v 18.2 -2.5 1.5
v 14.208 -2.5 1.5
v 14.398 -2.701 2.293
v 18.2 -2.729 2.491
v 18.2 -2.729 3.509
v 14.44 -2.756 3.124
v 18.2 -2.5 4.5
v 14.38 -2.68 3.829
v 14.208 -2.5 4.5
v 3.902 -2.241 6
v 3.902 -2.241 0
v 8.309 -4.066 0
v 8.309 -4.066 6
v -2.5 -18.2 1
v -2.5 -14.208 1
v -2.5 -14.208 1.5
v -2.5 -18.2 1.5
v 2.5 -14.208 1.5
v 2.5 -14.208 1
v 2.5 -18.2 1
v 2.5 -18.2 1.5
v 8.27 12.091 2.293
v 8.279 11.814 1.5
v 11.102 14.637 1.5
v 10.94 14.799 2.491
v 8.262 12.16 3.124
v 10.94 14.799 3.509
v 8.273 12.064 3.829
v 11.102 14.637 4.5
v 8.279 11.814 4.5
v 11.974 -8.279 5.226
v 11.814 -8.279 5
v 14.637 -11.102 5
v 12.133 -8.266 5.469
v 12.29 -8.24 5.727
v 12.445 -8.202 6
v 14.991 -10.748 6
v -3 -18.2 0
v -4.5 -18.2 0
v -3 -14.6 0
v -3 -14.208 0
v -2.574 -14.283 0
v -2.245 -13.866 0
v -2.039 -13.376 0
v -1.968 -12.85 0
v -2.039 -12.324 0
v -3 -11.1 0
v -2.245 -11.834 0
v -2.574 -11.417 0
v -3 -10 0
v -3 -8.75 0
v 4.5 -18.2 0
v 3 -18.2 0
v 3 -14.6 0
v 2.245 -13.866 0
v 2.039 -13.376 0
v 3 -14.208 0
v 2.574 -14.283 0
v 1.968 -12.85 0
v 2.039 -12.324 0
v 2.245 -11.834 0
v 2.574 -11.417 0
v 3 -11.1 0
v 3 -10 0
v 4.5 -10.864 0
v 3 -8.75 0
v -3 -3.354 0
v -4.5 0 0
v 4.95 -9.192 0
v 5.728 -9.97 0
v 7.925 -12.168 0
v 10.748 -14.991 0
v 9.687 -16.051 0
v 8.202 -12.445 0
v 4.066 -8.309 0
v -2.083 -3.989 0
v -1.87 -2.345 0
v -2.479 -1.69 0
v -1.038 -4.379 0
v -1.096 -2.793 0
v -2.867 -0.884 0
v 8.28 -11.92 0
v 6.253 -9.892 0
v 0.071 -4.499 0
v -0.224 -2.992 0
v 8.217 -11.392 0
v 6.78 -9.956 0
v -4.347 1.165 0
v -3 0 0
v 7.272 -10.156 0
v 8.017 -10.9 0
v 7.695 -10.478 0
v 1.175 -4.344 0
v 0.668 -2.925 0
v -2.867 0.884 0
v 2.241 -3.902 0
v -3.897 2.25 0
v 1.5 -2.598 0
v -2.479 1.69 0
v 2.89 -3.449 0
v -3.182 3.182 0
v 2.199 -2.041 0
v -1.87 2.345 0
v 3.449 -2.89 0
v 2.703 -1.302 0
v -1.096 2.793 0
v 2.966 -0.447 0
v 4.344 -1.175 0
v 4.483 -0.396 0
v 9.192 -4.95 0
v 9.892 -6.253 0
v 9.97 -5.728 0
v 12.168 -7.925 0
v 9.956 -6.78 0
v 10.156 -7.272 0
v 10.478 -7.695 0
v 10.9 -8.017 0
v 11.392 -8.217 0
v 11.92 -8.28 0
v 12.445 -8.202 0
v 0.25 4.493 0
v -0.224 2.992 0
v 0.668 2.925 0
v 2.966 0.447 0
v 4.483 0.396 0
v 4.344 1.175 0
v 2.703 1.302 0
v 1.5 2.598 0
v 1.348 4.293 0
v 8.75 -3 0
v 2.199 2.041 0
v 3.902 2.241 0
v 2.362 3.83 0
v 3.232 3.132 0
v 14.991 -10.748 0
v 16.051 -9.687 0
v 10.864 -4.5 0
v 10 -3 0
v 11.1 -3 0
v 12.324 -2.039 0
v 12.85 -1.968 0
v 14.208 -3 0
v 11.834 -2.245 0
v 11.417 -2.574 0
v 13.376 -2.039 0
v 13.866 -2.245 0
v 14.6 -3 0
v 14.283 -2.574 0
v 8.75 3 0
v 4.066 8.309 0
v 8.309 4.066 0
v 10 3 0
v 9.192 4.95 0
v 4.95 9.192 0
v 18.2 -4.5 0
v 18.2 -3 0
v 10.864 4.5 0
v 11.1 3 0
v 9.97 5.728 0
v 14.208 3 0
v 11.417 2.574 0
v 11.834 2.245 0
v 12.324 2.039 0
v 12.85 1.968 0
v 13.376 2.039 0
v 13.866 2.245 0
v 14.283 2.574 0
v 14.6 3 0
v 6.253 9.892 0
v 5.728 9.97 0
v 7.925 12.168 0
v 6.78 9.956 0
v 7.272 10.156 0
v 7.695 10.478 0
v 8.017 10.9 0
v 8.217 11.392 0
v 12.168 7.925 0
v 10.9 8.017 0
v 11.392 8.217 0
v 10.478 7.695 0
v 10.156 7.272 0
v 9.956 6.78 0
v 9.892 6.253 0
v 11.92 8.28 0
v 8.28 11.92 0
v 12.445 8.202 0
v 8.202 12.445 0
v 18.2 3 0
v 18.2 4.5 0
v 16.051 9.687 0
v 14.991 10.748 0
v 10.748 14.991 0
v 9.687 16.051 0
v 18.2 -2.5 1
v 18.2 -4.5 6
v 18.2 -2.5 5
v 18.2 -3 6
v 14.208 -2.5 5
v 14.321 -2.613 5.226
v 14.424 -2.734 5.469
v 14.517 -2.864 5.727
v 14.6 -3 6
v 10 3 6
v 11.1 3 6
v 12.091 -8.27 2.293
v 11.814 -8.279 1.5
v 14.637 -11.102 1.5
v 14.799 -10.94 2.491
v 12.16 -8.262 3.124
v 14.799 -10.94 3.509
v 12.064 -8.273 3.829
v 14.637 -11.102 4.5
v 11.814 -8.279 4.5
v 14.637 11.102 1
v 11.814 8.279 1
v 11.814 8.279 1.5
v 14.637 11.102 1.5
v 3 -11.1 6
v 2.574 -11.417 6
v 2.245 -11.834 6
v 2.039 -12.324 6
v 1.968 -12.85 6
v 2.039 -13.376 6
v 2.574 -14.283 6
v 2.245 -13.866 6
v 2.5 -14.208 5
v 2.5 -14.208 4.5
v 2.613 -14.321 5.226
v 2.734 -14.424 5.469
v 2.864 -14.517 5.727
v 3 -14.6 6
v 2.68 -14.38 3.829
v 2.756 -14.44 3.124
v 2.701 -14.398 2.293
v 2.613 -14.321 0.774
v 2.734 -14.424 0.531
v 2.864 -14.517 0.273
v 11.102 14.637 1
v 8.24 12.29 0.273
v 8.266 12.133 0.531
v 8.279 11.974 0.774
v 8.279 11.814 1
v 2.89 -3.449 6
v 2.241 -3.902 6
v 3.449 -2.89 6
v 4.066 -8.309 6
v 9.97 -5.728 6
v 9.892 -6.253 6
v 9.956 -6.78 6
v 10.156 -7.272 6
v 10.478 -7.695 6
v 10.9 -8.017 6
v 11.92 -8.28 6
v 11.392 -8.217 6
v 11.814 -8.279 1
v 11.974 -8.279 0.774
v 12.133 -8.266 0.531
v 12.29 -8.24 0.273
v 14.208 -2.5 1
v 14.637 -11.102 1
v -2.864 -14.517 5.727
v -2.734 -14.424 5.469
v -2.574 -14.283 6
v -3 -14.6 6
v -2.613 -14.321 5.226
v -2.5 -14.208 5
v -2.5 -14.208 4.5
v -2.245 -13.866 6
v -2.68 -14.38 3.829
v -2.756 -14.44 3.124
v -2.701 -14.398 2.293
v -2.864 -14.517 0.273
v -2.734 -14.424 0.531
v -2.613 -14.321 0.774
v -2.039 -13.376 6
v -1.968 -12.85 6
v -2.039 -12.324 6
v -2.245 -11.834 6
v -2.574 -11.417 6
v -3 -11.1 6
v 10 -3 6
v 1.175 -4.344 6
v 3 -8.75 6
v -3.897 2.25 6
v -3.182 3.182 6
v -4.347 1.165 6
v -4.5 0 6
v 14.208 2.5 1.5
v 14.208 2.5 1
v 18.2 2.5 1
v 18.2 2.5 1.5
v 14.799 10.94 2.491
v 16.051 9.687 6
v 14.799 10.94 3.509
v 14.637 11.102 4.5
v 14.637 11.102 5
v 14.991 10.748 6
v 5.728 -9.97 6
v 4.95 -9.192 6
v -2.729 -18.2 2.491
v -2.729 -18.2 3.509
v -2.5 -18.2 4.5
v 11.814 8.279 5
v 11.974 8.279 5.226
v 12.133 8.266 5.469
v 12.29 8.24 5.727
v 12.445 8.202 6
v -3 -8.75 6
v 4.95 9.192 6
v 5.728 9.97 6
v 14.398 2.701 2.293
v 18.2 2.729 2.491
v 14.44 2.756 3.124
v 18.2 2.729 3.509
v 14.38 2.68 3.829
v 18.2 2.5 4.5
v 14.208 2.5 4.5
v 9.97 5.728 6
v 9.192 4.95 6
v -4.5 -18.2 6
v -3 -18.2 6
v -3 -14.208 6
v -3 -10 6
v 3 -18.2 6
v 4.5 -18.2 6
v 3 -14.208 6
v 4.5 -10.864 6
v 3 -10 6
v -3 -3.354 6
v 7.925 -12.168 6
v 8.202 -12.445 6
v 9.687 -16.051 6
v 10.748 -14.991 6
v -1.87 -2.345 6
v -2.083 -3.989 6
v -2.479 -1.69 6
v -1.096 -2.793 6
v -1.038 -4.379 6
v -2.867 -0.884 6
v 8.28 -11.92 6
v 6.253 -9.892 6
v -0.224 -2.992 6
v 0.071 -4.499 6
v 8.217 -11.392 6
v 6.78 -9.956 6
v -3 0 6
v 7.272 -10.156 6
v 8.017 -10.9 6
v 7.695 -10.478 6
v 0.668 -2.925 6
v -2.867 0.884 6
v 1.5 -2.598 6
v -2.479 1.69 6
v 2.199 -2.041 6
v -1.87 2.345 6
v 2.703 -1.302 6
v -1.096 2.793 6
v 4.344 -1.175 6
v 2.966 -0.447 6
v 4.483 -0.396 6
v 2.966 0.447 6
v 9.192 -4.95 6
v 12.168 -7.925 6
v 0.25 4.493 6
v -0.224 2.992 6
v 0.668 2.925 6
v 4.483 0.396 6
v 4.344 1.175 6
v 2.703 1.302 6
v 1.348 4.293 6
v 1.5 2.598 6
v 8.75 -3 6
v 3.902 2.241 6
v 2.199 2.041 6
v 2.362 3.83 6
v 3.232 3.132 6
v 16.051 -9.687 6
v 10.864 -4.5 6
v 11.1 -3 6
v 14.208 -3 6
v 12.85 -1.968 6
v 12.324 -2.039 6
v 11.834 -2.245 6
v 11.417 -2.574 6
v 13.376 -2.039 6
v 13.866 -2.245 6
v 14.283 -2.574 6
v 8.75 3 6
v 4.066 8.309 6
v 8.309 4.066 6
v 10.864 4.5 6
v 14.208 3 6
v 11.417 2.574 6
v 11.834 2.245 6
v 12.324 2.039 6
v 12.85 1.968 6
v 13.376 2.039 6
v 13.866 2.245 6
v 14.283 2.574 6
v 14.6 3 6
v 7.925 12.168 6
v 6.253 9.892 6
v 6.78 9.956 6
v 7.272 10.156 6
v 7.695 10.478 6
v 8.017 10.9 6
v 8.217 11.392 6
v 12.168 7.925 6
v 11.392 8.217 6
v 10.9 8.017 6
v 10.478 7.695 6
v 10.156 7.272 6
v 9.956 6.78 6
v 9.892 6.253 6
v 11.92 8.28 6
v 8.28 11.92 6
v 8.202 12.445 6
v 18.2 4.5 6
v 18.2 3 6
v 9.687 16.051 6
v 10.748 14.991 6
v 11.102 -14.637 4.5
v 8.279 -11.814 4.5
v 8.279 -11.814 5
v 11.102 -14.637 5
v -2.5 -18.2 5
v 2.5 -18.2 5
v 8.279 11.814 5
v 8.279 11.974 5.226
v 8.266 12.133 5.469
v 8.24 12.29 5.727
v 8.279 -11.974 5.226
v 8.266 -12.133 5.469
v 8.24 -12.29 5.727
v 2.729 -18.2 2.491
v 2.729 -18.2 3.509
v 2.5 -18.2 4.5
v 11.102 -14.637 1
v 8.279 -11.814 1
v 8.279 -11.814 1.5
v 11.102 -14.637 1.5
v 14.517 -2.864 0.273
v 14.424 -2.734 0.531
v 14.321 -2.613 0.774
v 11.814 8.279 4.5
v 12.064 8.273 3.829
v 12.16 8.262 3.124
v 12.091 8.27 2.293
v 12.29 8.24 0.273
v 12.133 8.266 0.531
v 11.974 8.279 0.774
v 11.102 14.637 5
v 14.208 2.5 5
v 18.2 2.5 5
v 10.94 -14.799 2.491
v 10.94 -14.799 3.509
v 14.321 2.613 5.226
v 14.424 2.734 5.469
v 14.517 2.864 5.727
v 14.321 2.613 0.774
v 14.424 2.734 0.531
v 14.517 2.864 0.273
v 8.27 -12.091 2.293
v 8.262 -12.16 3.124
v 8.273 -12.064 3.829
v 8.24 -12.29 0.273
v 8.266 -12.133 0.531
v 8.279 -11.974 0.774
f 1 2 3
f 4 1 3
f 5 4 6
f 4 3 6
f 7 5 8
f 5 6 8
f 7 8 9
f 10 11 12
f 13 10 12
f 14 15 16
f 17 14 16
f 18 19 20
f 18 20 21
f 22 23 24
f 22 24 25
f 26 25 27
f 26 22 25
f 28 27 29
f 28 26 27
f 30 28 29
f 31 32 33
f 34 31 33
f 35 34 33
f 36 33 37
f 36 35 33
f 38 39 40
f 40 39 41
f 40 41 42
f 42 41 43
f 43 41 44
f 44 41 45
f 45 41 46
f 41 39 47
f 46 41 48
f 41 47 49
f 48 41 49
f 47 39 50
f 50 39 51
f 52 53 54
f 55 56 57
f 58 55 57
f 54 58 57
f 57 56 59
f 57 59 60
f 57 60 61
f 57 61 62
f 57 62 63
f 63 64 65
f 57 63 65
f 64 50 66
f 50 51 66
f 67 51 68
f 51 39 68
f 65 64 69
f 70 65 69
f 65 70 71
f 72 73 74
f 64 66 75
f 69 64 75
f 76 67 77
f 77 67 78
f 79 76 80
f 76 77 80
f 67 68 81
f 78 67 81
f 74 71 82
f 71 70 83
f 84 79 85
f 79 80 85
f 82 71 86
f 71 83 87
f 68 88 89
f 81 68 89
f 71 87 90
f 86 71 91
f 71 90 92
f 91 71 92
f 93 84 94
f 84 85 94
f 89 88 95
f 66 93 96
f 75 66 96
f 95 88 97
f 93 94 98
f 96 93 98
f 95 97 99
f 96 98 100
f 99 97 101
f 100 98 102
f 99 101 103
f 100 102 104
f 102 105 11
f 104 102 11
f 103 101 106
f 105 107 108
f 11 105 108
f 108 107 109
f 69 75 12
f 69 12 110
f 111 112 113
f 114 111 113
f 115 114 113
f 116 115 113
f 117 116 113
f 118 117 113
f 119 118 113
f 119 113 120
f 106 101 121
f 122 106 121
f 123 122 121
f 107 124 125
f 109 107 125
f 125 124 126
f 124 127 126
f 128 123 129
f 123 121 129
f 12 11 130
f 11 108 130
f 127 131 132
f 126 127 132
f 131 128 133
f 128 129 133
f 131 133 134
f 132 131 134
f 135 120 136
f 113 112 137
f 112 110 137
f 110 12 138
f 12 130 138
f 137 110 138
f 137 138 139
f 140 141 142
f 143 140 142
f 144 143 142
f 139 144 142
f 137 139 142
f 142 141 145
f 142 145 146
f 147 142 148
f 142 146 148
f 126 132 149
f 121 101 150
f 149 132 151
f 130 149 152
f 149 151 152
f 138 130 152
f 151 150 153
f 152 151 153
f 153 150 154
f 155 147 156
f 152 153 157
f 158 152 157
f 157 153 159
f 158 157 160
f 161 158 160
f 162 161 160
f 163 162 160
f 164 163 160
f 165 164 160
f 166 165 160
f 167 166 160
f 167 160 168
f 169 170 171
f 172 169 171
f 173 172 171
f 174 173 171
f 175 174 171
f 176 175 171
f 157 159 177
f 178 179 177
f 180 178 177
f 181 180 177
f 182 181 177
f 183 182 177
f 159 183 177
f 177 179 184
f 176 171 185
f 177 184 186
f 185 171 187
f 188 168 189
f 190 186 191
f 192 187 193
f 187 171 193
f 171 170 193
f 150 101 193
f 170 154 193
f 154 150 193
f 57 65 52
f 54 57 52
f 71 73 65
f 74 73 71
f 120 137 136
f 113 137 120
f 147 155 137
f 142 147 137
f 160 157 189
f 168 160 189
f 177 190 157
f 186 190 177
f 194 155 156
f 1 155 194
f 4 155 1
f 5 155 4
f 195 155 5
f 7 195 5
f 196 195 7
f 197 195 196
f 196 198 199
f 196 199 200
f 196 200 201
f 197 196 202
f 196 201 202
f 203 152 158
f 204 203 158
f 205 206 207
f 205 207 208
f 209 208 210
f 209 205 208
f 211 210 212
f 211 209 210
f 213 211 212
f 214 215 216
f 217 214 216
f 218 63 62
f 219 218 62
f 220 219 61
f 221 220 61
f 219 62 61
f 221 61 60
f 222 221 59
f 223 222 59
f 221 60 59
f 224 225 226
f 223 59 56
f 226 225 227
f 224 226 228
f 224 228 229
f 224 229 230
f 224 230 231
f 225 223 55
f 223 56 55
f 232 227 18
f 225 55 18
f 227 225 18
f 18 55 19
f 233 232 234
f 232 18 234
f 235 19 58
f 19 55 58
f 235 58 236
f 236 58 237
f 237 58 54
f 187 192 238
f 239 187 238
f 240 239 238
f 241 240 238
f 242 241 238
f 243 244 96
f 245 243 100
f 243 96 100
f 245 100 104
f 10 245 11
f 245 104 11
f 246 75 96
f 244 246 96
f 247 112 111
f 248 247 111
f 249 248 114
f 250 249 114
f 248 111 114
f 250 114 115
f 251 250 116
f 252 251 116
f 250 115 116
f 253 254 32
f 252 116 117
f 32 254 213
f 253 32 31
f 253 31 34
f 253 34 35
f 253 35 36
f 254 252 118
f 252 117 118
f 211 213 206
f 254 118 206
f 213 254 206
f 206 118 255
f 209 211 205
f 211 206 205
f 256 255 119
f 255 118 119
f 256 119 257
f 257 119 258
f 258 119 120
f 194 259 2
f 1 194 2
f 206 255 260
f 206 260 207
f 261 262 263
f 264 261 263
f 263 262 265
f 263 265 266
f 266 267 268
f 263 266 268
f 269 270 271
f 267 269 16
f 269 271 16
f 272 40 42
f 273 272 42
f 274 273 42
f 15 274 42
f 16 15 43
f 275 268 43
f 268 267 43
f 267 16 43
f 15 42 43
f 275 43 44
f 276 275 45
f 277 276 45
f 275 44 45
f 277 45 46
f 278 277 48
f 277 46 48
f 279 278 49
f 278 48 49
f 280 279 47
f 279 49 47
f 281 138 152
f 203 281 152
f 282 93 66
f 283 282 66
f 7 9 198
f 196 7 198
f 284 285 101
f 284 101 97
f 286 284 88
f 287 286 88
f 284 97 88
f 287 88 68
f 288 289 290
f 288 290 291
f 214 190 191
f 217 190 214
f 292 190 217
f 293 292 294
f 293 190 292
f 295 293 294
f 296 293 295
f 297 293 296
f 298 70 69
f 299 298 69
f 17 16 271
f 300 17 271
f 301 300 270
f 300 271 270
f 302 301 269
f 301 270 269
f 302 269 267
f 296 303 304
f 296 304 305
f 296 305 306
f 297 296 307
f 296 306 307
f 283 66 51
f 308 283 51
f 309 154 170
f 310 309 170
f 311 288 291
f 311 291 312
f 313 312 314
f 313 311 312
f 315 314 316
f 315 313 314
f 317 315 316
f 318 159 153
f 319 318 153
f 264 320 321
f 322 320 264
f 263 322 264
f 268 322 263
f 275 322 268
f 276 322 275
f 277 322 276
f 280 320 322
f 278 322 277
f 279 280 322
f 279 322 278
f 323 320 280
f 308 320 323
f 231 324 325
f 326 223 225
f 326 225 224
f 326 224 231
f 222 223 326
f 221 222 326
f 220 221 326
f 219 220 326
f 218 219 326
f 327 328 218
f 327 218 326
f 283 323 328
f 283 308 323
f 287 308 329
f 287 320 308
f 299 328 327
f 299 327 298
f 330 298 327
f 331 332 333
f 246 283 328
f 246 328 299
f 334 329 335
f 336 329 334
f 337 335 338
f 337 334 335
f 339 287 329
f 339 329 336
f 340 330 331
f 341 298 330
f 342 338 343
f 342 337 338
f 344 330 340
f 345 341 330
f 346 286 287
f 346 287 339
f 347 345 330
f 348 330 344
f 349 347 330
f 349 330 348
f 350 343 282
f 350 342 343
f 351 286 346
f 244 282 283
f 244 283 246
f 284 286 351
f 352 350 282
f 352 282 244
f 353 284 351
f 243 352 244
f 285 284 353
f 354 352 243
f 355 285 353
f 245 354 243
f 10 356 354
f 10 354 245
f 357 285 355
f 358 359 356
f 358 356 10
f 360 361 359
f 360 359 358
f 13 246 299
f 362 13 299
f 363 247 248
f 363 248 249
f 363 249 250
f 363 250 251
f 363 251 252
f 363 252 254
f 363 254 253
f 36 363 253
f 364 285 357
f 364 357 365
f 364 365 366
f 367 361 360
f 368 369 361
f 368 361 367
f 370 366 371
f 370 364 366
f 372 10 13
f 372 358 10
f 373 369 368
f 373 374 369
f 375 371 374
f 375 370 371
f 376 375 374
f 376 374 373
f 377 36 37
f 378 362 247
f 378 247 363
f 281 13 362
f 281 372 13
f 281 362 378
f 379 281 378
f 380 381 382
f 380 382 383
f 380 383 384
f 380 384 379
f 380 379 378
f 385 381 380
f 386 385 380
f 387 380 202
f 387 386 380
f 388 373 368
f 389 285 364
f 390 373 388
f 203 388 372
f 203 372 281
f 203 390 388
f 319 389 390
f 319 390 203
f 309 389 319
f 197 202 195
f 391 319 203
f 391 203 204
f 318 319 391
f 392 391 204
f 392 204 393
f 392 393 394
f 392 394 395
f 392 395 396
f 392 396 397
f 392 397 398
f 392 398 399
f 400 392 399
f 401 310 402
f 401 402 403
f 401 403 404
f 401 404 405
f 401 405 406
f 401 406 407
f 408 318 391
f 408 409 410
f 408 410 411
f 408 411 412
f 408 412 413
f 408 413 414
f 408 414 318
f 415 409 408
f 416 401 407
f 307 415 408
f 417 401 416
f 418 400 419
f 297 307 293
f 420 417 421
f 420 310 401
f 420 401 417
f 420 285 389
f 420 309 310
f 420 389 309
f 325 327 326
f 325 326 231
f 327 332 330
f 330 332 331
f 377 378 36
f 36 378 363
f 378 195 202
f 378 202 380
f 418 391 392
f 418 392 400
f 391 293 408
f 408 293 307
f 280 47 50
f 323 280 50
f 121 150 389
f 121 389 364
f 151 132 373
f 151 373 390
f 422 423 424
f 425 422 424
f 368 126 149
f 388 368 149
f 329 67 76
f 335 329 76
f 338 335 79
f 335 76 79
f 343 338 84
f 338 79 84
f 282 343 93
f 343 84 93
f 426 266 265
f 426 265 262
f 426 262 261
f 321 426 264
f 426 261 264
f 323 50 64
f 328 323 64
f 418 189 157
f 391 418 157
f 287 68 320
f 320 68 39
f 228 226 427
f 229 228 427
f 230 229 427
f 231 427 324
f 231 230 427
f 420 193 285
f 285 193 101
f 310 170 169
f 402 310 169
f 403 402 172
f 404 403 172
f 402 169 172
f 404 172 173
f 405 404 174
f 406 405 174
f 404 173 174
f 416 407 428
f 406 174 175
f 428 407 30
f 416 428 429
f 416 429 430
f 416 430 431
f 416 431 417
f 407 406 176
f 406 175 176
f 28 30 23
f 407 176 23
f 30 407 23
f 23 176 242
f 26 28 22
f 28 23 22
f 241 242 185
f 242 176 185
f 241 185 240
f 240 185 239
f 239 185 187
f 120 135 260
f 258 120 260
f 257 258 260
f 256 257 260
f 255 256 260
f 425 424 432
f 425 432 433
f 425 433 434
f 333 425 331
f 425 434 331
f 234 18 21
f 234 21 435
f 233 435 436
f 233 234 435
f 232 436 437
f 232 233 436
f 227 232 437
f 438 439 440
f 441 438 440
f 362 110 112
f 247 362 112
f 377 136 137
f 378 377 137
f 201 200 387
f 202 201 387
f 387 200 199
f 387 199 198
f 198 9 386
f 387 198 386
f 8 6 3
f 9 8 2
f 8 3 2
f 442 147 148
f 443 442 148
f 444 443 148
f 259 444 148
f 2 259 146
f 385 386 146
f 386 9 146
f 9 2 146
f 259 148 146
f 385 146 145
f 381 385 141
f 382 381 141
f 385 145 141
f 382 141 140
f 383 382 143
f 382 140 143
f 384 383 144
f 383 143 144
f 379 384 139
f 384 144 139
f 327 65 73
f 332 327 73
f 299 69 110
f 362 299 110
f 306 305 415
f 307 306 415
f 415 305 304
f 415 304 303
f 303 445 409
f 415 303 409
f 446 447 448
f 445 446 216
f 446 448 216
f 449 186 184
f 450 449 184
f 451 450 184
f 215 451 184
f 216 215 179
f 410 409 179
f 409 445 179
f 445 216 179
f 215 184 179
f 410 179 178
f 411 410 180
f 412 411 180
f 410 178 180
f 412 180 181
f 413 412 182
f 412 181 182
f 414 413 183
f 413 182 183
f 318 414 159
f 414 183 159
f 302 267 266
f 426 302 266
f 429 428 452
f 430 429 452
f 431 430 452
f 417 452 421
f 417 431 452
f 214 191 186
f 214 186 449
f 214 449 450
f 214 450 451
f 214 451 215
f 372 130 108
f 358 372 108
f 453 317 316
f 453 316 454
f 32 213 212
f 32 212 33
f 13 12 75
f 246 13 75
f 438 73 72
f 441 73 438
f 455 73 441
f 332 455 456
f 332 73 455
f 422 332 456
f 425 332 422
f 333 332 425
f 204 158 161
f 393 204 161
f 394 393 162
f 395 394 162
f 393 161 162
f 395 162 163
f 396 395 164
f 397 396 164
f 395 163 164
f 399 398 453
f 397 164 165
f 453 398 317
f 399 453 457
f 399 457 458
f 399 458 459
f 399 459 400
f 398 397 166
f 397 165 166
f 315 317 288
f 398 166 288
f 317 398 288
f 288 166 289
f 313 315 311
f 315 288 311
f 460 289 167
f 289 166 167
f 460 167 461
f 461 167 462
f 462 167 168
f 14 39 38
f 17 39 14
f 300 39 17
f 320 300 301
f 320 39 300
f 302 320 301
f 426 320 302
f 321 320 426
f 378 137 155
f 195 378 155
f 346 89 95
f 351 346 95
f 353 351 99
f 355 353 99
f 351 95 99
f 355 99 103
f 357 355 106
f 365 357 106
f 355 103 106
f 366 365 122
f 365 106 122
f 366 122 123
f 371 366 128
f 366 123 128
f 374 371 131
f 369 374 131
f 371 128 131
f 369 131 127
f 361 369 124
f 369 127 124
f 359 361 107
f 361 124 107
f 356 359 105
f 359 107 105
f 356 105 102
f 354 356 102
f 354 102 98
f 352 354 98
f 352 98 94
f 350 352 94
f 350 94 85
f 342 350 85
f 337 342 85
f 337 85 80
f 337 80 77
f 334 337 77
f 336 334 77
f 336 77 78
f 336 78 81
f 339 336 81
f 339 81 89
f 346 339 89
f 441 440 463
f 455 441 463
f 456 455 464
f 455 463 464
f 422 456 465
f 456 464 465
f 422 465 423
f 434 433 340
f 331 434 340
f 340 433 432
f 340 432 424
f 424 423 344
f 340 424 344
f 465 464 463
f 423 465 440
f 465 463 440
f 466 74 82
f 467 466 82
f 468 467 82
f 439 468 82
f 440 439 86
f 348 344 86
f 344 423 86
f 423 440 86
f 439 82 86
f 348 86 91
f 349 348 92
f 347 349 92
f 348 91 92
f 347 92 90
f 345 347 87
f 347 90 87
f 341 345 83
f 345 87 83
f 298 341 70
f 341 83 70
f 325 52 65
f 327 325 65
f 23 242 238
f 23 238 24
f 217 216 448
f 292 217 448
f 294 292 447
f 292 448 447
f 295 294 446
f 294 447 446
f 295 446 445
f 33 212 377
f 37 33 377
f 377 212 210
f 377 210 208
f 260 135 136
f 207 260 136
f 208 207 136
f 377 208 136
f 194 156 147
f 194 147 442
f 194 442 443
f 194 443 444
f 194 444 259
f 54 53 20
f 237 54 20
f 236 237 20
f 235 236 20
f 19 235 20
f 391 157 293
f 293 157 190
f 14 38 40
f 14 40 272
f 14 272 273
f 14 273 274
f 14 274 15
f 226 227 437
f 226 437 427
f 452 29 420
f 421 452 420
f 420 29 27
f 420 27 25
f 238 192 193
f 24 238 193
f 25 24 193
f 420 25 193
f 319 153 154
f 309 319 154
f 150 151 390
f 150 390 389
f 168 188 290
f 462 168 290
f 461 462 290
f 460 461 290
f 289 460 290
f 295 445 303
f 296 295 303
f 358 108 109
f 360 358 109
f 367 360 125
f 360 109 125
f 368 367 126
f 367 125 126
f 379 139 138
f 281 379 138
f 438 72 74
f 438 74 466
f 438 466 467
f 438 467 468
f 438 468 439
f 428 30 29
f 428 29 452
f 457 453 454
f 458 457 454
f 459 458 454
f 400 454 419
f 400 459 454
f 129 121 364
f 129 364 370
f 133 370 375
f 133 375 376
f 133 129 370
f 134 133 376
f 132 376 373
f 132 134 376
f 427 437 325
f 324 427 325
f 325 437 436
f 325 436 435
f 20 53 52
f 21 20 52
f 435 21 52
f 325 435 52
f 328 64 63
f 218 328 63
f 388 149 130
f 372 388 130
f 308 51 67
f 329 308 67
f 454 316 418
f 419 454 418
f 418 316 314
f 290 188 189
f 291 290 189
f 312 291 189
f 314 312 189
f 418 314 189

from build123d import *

# Parameters (mm, degrees)
EXTRUDE_1_DEPTH          = 6
EXTRUDE_2_REACH          = 25.907
PATTERN_CIRCULAR_1_COUNT = 4
PATTERN_CIRCULAR_1_ANGLE = 135
SKETCH_4_R               = 3
CUT_EXTRUDE_1_DEPTH      = 27.42877236


with BuildPart() as part:
    # 草图1 → 凸台-拉伸1 (new body)
    with BuildSketch(Plane.XY):
        with BuildLine():
            Line((-4.5, 0), (-4.5, -18.2))
            Line((-4.5, -18.2), (-3, -18.2))
            Line((-3, -18.2), (-3, -14.6))
            ThreePointArc((-3, -14.6), (-1.968245837, -12.85), (-3, -11.1))
            Line((-3, -11.1), (-3, -10))
            Line((-3, -10), (3, -10))
            Line((3, -10), (3, -11.1))
            ThreePointArc((3, -11.1), (1.968245837, -12.85), (3, -14.6))
            Line((3, -14.6), (3, -18.2))
            Line((3, -18.2), (4.5, -18.2))
            Line((4.5, -18.2), (4.5, 0))
            ThreePointArc((4.5, 0), (0, 4.5), (-4.5, 0))
        make_face()
    extrude_1 = extrude(amount=EXTRUDE_1_DEPTH)

    # 草图3 → 凸台-拉伸2 (add, up to next)
    with BuildSketch(Plane.XZ.offset(18.2), mode=Mode.PRIVATE) as extrude_2_sk1:
        with BuildLine():
            Line((-3, 6), (-3, 0))
            Line((-3, 0), (-2.5, 1))
            Line((-2.5, 1), (-2.5, 1.5))
            ThreePointArc((-2.5, 1.5), (-2.757359313, 3), (-2.5, 4.5))
            Line((-2.5, 4.5), (-2.5, 5))
            Line((-2.5, 5), (-3, 6))
        make_face()
    extrude_2_tool1 = extrude(extrude_2_sk1.sketch, amount=-EXTRUDE_2_REACH, mode=Mode.PRIVATE) - part.part
    # 草图3 → 凸台-拉伸2 (add, up to next)
    with BuildSketch(Plane.XZ.offset(18.2), mode=Mode.PRIVATE) as extrude_2_sk2:
        with BuildLine():
            Line((3, 0), (2.5, 1))
            Line((2.5, 1), (2.5, 1.5))
            ThreePointArc((2.5, 1.5), (2.757359313, 3), (2.5, 4.5))
            Line((2.5, 4.5), (2.5, 5))
            Line((2.5, 5), (3, 6))
            Line((3, 6), (3, 0))
        make_face()
    extrude_2_tool2 = extrude(extrude_2_sk2.sketch, amount=-EXTRUDE_2_REACH, mode=Mode.PRIVATE) - part.part
    extrude_2_1 = extrude_2_tool1.solids().sort_by_distance((-2.809362, -18.2, 3))[0]
    add(extrude_2_1)
    extrude_2_2 = extrude_2_tool2.solids().sort_by_distance((2.809362, -18.2, 3))[0]
    add(extrude_2_2)
    extrude_2 = extrude_2_1 + extrude_2_2  # 凸台-拉伸2 as one shape, for the pattern or mirror that repeats it

    # 阵列(圆周)1: 凸台-拉伸1, 凸台-拉伸2 ×4 about axis
    pattern_circular_1_axis = Axis((0, 0, 0), (0, 0, 1))
    add([extrude_1.rotate(pattern_circular_1_axis, i * PATTERN_CIRCULAR_1_ANGLE / (PATTERN_CIRCULAR_1_COUNT - 1)) for i in range(1, PATTERN_CIRCULAR_1_COUNT)])
    add([extrude_2.rotate(pattern_circular_1_axis, i * PATTERN_CIRCULAR_1_ANGLE / (PATTERN_CIRCULAR_1_COUNT - 1)) for i in range(1, PATTERN_CIRCULAR_1_COUNT)])

    # 草图4 → 切除-拉伸1 (cut, through all)
    with BuildSketch(Plane(origin=(0, 0, 0), x_dir=(-1, 0, 0), z_dir=(0, 0, -1))):
        Circle(SKETCH_4_R)
        with BuildLine():
            Line((3, -8.75), (3, -3.354101966))
            ThreePointArc((3, -3.354101966), (1.038095674, -4.378625055), (-1.174936357, -4.343906601))
            Line((-1.174936357, -4.343906601), (-3, -8.75))
            Line((-3, -8.75), (3, -8.75))
        make_face()
        with BuildLine():
            Line((-8.308504679, -4.065863992), (-4.065863992, -8.308504679))
            Line((-4.065863992, -8.308504679), (-2.240800349, -3.90241128))
            ThreePointArc((-2.240800349, -3.90241128), (-3.181980515, -3.181980515), (-3.90241128, -2.240800349))
            Line((-3.90241128, -2.240800349), (-8.308504679, -4.065863992))
        make_face()
        with BuildLine():
            Line((-8.75, -3), (-4.343906601, -1.174936357))
            ThreePointArc((-4.343906601, -1.174936357), (-4.5, 0), (-4.343906601, 1.174936357))
            Line((-4.343906601, 1.174936357), (-8.75, 3))
            Line((-8.75, 3), (-8.75, -3))
        make_face()
        with BuildLine():
            Line((-4.065863992, 8.308504679), (-0.250387902, 4.493028589))
            ThreePointArc((-0.250387902, 4.493028589), (-2.362110978, 3.830199959), (-3.90241128, 2.240800349))
            Line((-3.90241128, 2.240800349), (-8.308504679, 4.065863992))
            Line((-8.308504679, 4.065863992), (-4.065863992, 8.308504679))
        make_face()
    extrude(amount=-CUT_EXTRUDE_1_DEPTH, mode=Mode.SUBTRACT)


solid = part.part
